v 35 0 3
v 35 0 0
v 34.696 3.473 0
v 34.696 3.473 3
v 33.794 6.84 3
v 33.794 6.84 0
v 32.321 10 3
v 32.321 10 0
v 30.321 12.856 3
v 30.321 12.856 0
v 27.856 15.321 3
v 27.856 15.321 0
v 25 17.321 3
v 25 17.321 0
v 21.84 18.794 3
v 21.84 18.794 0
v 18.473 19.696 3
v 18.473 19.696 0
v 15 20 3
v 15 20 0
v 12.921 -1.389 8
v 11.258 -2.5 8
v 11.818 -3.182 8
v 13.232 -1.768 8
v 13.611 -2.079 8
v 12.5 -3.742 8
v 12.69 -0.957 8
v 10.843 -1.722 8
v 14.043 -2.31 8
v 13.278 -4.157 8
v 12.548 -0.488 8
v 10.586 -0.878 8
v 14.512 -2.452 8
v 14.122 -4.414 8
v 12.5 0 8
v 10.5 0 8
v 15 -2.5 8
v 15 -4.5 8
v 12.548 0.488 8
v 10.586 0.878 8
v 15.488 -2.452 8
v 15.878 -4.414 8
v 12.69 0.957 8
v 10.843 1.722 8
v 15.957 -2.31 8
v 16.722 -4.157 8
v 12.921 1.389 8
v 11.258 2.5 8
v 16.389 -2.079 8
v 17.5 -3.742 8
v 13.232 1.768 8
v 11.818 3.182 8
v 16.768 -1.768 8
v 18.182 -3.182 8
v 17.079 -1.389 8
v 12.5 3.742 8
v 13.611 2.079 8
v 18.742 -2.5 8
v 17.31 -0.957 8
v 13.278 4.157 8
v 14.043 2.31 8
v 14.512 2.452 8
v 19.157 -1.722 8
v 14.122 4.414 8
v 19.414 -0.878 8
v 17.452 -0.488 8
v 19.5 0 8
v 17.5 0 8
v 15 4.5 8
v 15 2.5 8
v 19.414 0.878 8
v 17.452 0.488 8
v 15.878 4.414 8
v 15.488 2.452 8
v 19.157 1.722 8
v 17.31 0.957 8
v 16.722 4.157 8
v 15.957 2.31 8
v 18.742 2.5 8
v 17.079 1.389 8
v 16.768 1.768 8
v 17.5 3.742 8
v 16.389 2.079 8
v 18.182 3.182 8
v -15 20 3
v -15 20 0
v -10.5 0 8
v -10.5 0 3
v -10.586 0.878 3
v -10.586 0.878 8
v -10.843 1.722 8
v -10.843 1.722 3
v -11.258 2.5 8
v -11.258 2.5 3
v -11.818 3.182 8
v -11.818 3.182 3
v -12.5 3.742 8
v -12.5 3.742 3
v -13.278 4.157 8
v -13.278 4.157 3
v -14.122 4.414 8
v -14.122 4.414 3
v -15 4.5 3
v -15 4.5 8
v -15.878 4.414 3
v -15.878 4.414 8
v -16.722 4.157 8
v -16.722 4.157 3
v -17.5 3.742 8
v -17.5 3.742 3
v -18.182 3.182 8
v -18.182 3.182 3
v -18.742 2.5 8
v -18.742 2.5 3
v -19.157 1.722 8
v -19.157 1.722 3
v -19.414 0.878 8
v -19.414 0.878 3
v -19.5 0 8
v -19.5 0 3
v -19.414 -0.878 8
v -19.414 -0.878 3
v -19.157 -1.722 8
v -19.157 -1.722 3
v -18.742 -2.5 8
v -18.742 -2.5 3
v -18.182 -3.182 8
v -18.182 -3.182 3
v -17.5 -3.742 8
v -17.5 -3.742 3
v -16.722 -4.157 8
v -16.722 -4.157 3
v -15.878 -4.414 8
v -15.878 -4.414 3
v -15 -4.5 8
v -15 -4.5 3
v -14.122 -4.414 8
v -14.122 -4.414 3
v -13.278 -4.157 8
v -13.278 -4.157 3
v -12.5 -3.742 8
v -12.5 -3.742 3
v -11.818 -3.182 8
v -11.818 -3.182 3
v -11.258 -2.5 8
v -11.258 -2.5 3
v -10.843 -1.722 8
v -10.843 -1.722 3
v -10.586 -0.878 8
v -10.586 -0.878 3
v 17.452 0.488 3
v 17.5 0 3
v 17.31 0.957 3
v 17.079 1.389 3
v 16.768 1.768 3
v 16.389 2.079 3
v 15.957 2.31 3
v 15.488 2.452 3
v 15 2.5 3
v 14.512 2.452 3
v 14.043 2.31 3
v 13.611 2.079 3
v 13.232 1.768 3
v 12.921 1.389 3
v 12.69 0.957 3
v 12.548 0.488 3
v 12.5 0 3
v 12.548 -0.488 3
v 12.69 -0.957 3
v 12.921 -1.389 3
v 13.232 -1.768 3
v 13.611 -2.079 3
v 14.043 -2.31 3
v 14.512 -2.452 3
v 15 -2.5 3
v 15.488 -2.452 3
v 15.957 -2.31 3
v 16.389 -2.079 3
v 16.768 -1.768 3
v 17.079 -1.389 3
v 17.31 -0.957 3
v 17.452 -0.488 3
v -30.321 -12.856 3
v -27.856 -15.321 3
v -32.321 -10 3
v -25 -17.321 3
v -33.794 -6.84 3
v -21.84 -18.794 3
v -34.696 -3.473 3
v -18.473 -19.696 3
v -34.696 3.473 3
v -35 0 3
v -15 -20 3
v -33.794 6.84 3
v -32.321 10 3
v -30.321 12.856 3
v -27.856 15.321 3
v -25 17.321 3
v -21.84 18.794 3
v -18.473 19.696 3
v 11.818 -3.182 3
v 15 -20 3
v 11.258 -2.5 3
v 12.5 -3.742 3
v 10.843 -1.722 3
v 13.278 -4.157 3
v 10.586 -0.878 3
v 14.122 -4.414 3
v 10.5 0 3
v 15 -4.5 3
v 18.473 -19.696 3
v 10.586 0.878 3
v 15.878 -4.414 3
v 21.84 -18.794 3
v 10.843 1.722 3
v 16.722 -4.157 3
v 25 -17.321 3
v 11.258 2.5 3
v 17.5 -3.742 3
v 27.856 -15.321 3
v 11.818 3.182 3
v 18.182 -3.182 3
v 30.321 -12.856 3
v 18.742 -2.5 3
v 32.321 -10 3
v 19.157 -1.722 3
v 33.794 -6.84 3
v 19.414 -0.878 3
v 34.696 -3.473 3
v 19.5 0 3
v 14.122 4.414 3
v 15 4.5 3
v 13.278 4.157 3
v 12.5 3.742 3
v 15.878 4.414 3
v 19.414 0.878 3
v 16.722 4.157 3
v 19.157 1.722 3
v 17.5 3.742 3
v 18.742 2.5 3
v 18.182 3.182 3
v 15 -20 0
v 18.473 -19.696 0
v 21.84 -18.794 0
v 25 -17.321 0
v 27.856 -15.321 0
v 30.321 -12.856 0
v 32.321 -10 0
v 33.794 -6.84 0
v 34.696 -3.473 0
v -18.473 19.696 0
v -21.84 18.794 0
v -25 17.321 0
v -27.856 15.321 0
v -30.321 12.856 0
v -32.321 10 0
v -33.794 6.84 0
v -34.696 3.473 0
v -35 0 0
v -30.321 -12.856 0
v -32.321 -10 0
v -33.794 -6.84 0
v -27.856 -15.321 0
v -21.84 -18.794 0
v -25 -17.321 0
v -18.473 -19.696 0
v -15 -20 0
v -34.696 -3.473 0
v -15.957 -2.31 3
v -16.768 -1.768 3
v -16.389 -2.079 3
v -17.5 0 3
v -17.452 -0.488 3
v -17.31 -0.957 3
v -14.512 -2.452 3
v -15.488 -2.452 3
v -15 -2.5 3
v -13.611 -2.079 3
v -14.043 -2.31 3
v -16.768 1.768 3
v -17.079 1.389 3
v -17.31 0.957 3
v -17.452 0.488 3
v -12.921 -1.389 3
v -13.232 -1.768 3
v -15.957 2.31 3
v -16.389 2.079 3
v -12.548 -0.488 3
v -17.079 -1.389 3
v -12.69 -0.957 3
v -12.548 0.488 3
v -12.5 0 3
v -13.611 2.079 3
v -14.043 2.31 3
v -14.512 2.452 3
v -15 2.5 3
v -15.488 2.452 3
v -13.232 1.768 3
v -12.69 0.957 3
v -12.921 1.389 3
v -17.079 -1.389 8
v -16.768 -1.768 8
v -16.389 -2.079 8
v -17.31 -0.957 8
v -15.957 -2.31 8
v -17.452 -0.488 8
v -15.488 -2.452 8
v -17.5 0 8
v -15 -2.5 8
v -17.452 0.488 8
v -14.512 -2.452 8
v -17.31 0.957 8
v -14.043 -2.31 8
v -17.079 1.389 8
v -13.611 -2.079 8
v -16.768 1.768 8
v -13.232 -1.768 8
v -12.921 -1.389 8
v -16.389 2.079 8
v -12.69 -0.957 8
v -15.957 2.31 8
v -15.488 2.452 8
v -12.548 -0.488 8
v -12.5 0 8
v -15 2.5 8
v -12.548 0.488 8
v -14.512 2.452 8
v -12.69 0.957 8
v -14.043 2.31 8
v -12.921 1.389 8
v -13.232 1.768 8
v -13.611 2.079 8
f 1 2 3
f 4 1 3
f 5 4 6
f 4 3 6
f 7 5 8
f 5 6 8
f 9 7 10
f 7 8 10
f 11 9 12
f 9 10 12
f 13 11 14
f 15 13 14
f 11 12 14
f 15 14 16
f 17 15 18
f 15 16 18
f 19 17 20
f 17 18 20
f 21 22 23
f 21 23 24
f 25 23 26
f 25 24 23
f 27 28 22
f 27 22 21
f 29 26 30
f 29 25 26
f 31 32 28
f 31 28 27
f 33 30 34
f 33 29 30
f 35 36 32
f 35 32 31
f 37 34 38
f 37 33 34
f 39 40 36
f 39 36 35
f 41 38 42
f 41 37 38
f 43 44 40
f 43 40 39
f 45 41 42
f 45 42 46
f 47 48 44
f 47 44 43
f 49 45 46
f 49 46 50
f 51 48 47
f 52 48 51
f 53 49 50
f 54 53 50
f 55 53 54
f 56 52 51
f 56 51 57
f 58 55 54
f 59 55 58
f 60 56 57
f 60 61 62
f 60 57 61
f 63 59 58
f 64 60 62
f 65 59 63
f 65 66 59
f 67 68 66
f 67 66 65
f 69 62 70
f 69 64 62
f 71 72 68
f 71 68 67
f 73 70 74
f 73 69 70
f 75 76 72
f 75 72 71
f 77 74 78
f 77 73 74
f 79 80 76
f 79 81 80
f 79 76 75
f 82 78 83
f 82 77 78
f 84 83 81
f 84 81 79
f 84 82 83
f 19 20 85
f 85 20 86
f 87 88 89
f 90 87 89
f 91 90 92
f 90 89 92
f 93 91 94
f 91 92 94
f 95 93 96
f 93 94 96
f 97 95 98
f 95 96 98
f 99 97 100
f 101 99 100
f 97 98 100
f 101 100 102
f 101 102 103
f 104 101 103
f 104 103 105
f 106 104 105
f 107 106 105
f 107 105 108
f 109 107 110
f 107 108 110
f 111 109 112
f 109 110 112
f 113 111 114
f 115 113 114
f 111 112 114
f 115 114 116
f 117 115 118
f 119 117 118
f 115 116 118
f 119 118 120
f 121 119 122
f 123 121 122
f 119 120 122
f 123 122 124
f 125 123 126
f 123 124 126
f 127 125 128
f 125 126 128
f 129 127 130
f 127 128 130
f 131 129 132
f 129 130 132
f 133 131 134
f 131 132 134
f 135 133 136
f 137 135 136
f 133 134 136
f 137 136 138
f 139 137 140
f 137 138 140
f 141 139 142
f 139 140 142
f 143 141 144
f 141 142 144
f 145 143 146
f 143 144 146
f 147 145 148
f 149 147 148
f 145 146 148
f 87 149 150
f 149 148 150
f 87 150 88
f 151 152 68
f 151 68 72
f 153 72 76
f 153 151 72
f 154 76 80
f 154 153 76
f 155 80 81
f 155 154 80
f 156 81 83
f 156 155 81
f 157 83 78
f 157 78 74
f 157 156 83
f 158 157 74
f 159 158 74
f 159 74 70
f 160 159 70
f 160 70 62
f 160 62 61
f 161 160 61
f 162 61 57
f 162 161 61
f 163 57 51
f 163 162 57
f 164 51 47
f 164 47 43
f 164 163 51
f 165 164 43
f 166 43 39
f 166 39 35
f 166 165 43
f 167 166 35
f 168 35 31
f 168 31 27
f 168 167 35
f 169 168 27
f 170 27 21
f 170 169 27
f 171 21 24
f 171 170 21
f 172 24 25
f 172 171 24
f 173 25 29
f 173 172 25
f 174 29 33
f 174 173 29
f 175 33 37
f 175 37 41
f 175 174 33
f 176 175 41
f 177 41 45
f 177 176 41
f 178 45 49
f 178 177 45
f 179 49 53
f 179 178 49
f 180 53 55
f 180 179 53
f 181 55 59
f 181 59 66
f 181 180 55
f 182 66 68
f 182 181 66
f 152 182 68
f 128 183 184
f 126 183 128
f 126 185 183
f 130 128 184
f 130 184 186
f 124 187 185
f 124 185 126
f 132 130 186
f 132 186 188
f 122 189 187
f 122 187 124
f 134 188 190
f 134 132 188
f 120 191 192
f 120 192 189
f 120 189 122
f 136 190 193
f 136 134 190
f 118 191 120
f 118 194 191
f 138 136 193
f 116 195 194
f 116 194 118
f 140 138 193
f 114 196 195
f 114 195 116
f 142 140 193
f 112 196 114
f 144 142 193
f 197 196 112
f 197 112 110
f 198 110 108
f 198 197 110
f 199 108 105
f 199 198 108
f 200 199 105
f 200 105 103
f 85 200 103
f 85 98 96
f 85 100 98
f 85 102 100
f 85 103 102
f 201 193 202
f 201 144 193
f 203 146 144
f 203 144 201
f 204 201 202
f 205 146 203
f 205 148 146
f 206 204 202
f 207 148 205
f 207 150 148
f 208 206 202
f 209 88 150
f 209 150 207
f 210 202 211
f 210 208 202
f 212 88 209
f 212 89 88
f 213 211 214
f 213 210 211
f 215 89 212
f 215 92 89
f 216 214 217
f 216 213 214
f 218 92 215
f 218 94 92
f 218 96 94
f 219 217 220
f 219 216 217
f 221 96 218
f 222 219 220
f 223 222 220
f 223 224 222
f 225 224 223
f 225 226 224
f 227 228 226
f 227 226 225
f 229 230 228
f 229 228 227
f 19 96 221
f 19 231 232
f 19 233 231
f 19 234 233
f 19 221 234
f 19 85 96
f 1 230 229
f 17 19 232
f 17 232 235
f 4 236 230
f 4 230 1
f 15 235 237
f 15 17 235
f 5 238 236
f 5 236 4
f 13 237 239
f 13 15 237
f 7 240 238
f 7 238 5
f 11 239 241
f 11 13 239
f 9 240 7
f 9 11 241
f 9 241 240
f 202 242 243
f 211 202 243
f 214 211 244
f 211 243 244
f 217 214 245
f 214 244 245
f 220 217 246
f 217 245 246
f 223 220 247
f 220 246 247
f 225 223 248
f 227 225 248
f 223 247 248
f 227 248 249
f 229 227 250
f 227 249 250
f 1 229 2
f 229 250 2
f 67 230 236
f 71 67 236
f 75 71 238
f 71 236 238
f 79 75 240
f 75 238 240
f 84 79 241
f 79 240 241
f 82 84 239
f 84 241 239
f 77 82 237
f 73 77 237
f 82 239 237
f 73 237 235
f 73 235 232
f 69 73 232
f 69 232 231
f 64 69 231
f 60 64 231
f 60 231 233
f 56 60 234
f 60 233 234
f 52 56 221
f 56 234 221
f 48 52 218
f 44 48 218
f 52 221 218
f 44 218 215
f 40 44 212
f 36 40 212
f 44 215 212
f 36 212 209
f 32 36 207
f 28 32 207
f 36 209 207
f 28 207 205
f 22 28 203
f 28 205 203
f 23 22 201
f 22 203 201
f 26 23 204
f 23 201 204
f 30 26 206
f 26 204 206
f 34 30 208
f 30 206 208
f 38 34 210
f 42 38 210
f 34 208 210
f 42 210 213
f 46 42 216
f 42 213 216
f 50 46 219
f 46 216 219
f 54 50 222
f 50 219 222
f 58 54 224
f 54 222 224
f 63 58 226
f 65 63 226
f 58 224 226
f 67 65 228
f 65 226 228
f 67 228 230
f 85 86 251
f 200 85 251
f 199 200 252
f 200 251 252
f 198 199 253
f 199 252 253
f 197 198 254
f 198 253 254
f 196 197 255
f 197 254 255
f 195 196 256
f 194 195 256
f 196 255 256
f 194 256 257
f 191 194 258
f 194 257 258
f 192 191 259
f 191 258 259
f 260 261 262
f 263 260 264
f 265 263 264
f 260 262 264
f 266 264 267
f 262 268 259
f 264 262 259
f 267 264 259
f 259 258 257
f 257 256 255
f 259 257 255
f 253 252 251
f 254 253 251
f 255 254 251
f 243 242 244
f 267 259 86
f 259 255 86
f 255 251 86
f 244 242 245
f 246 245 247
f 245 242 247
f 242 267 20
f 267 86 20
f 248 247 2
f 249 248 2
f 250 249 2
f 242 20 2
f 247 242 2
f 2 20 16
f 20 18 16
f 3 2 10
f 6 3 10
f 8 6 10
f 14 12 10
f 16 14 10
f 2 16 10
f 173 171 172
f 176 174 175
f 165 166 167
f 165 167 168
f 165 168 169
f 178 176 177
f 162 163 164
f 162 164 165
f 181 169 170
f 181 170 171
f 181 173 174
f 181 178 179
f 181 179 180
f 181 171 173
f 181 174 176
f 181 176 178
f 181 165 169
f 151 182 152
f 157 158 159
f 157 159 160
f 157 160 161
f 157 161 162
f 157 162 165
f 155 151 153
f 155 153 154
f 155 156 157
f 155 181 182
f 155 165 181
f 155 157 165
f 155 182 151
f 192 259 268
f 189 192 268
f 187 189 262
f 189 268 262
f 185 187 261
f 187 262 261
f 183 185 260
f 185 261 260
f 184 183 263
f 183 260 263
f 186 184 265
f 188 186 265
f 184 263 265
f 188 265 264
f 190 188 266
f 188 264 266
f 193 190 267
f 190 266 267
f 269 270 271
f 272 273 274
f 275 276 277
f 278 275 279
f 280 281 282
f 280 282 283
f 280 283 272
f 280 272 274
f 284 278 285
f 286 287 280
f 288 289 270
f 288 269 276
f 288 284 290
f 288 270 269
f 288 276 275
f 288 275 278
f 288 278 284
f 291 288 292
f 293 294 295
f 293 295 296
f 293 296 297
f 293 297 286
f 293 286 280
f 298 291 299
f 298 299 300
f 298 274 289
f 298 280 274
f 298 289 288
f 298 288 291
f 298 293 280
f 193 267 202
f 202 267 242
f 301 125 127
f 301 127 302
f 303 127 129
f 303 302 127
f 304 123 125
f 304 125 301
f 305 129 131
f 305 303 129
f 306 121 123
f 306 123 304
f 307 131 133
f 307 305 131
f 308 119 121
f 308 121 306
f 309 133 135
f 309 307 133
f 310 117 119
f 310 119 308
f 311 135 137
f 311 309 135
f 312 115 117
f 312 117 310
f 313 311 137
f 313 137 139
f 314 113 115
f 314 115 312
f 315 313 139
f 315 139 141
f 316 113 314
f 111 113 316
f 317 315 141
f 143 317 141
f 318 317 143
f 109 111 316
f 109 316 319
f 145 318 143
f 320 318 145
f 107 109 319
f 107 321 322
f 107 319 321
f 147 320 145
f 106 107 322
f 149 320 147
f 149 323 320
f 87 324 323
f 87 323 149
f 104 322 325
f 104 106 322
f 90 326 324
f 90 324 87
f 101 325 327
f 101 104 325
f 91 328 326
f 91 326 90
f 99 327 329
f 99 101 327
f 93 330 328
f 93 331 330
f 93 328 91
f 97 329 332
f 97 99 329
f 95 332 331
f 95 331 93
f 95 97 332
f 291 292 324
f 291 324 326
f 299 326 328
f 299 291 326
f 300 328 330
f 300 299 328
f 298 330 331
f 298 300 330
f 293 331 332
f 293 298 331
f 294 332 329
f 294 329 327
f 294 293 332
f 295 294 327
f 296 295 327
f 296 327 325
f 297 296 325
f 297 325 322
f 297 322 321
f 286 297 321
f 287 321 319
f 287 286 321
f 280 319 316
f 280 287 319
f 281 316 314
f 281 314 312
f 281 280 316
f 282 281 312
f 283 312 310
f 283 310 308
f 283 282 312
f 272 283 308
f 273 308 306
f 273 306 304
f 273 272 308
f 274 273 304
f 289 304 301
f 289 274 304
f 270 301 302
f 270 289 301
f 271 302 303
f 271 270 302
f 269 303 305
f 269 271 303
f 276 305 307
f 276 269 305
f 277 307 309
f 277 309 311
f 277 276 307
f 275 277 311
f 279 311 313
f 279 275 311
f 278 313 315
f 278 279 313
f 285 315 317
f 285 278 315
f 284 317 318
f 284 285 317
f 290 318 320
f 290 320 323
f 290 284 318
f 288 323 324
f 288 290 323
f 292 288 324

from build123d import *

# Parameters (mm, degrees)
F1_DEPTH = 3
F2_R     = 4.5
F2_R_2   = 2.5
F3_DEPTH = 5


with BuildPart() as f1:
    # F0 (on Top) → F1 (new body)
    with BuildSketch(Plane.XY):
        with BuildLine():
            Line((-15, -20), (15, -20))
            ThreePointArc((15, -20), (29.142136, -14.142136), (35, 0))
            ThreePointArc((35, 0), (29.142136, 14.142136), (15, 20))
            Line((15, 20), (-15, 20))
            ThreePointArc((-15, 20), (-29.142136, 14.142136), (-35, 0))
            ThreePointArc((-35, 0), (-29.142136, -14.142136), (-15, -20))
        make_face()
    extrude(amount=F1_DEPTH)

    # F2 (on face) → F3 (join)
    with BuildSketch(Plane.XY.offset(3)):
        with Locations((-15, 0)):
            Circle(F2_R)
        with Locations((-15, 0)):
            Circle(F2_R_2, mode=Mode.SUBTRACT)
        with Locations((15, 0)):
            Circle(F2_R)
        with Locations((15, 0)):
            Circle(F2_R_2, mode=Mode.SUBTRACT)
    extrude(amount=F3_DEPTH)


solid = f1.part
